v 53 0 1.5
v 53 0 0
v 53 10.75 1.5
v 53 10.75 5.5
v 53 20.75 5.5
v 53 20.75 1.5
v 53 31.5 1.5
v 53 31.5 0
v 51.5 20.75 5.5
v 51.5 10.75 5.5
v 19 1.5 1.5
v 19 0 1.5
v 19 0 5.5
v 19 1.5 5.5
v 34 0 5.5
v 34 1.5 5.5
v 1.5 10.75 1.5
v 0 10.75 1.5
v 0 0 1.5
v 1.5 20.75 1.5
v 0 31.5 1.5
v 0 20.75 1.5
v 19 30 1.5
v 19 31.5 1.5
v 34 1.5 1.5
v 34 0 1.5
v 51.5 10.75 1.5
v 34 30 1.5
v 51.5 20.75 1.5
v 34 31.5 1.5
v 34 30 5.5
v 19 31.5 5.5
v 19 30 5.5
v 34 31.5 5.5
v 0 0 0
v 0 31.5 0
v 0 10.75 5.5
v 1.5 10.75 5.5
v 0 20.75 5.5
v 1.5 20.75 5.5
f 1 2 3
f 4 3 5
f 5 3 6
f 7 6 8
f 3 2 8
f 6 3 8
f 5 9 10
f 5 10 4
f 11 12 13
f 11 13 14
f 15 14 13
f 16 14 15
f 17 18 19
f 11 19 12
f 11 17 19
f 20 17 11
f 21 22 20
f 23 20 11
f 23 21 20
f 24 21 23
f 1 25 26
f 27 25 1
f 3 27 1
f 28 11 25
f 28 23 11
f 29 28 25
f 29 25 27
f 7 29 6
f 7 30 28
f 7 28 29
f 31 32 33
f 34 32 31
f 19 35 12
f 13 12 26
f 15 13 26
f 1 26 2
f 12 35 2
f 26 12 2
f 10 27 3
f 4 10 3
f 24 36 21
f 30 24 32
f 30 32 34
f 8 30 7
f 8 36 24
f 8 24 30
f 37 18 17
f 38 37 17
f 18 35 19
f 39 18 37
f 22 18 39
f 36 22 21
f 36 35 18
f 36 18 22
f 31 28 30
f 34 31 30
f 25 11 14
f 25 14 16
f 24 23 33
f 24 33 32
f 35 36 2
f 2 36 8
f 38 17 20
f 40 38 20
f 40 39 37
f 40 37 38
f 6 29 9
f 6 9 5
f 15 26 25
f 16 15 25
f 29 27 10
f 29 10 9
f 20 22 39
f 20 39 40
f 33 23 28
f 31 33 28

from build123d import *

# Parameters (mm, degrees)
SKETCH1_W           = 53
SKETCH1_H           = 31.5
BOSS_EXTRUDE1_DEPTH = 1.5
SKETCH2_W           = 1.5
SKETCH2_H           = 10
SKETCH2_W_2         = 15
SKETCH2_H_2         = 1.5
BOSS_EXTRUDE2_DEPTH = 4


with BuildPart() as part:
    # Sketch1 → Boss-Extrude1 (new body)
    with BuildSketch(Plane.XY):
        with Locations((26.5, 15.75)):
            Rectangle(SKETCH1_W, SKETCH1_H)
    extrude(amount=BOSS_EXTRUDE1_DEPTH)

    # Sketch2 → Boss-Extrude2 (add)
    with BuildSketch(Plane.XY.offset(1.5)):
        with Locations((0.75, 15.75)):
            Rectangle(SKETCH2_W, SKETCH2_H)
        with Locations((26.5, 30.75)):
            Rectangle(SKETCH2_W_2, SKETCH2_H_2)
        with Locations((52.25, 15.75)):
            Rectangle(SKETCH2_W, SKETCH2_H)
        with Locations((26.5, 0.75)):
            Rectangle(SKETCH2_W_2, SKETCH2_H_2)
    extrude(amount=BOSS_EXTRUDE2_DEPTH)


solid = part.part
